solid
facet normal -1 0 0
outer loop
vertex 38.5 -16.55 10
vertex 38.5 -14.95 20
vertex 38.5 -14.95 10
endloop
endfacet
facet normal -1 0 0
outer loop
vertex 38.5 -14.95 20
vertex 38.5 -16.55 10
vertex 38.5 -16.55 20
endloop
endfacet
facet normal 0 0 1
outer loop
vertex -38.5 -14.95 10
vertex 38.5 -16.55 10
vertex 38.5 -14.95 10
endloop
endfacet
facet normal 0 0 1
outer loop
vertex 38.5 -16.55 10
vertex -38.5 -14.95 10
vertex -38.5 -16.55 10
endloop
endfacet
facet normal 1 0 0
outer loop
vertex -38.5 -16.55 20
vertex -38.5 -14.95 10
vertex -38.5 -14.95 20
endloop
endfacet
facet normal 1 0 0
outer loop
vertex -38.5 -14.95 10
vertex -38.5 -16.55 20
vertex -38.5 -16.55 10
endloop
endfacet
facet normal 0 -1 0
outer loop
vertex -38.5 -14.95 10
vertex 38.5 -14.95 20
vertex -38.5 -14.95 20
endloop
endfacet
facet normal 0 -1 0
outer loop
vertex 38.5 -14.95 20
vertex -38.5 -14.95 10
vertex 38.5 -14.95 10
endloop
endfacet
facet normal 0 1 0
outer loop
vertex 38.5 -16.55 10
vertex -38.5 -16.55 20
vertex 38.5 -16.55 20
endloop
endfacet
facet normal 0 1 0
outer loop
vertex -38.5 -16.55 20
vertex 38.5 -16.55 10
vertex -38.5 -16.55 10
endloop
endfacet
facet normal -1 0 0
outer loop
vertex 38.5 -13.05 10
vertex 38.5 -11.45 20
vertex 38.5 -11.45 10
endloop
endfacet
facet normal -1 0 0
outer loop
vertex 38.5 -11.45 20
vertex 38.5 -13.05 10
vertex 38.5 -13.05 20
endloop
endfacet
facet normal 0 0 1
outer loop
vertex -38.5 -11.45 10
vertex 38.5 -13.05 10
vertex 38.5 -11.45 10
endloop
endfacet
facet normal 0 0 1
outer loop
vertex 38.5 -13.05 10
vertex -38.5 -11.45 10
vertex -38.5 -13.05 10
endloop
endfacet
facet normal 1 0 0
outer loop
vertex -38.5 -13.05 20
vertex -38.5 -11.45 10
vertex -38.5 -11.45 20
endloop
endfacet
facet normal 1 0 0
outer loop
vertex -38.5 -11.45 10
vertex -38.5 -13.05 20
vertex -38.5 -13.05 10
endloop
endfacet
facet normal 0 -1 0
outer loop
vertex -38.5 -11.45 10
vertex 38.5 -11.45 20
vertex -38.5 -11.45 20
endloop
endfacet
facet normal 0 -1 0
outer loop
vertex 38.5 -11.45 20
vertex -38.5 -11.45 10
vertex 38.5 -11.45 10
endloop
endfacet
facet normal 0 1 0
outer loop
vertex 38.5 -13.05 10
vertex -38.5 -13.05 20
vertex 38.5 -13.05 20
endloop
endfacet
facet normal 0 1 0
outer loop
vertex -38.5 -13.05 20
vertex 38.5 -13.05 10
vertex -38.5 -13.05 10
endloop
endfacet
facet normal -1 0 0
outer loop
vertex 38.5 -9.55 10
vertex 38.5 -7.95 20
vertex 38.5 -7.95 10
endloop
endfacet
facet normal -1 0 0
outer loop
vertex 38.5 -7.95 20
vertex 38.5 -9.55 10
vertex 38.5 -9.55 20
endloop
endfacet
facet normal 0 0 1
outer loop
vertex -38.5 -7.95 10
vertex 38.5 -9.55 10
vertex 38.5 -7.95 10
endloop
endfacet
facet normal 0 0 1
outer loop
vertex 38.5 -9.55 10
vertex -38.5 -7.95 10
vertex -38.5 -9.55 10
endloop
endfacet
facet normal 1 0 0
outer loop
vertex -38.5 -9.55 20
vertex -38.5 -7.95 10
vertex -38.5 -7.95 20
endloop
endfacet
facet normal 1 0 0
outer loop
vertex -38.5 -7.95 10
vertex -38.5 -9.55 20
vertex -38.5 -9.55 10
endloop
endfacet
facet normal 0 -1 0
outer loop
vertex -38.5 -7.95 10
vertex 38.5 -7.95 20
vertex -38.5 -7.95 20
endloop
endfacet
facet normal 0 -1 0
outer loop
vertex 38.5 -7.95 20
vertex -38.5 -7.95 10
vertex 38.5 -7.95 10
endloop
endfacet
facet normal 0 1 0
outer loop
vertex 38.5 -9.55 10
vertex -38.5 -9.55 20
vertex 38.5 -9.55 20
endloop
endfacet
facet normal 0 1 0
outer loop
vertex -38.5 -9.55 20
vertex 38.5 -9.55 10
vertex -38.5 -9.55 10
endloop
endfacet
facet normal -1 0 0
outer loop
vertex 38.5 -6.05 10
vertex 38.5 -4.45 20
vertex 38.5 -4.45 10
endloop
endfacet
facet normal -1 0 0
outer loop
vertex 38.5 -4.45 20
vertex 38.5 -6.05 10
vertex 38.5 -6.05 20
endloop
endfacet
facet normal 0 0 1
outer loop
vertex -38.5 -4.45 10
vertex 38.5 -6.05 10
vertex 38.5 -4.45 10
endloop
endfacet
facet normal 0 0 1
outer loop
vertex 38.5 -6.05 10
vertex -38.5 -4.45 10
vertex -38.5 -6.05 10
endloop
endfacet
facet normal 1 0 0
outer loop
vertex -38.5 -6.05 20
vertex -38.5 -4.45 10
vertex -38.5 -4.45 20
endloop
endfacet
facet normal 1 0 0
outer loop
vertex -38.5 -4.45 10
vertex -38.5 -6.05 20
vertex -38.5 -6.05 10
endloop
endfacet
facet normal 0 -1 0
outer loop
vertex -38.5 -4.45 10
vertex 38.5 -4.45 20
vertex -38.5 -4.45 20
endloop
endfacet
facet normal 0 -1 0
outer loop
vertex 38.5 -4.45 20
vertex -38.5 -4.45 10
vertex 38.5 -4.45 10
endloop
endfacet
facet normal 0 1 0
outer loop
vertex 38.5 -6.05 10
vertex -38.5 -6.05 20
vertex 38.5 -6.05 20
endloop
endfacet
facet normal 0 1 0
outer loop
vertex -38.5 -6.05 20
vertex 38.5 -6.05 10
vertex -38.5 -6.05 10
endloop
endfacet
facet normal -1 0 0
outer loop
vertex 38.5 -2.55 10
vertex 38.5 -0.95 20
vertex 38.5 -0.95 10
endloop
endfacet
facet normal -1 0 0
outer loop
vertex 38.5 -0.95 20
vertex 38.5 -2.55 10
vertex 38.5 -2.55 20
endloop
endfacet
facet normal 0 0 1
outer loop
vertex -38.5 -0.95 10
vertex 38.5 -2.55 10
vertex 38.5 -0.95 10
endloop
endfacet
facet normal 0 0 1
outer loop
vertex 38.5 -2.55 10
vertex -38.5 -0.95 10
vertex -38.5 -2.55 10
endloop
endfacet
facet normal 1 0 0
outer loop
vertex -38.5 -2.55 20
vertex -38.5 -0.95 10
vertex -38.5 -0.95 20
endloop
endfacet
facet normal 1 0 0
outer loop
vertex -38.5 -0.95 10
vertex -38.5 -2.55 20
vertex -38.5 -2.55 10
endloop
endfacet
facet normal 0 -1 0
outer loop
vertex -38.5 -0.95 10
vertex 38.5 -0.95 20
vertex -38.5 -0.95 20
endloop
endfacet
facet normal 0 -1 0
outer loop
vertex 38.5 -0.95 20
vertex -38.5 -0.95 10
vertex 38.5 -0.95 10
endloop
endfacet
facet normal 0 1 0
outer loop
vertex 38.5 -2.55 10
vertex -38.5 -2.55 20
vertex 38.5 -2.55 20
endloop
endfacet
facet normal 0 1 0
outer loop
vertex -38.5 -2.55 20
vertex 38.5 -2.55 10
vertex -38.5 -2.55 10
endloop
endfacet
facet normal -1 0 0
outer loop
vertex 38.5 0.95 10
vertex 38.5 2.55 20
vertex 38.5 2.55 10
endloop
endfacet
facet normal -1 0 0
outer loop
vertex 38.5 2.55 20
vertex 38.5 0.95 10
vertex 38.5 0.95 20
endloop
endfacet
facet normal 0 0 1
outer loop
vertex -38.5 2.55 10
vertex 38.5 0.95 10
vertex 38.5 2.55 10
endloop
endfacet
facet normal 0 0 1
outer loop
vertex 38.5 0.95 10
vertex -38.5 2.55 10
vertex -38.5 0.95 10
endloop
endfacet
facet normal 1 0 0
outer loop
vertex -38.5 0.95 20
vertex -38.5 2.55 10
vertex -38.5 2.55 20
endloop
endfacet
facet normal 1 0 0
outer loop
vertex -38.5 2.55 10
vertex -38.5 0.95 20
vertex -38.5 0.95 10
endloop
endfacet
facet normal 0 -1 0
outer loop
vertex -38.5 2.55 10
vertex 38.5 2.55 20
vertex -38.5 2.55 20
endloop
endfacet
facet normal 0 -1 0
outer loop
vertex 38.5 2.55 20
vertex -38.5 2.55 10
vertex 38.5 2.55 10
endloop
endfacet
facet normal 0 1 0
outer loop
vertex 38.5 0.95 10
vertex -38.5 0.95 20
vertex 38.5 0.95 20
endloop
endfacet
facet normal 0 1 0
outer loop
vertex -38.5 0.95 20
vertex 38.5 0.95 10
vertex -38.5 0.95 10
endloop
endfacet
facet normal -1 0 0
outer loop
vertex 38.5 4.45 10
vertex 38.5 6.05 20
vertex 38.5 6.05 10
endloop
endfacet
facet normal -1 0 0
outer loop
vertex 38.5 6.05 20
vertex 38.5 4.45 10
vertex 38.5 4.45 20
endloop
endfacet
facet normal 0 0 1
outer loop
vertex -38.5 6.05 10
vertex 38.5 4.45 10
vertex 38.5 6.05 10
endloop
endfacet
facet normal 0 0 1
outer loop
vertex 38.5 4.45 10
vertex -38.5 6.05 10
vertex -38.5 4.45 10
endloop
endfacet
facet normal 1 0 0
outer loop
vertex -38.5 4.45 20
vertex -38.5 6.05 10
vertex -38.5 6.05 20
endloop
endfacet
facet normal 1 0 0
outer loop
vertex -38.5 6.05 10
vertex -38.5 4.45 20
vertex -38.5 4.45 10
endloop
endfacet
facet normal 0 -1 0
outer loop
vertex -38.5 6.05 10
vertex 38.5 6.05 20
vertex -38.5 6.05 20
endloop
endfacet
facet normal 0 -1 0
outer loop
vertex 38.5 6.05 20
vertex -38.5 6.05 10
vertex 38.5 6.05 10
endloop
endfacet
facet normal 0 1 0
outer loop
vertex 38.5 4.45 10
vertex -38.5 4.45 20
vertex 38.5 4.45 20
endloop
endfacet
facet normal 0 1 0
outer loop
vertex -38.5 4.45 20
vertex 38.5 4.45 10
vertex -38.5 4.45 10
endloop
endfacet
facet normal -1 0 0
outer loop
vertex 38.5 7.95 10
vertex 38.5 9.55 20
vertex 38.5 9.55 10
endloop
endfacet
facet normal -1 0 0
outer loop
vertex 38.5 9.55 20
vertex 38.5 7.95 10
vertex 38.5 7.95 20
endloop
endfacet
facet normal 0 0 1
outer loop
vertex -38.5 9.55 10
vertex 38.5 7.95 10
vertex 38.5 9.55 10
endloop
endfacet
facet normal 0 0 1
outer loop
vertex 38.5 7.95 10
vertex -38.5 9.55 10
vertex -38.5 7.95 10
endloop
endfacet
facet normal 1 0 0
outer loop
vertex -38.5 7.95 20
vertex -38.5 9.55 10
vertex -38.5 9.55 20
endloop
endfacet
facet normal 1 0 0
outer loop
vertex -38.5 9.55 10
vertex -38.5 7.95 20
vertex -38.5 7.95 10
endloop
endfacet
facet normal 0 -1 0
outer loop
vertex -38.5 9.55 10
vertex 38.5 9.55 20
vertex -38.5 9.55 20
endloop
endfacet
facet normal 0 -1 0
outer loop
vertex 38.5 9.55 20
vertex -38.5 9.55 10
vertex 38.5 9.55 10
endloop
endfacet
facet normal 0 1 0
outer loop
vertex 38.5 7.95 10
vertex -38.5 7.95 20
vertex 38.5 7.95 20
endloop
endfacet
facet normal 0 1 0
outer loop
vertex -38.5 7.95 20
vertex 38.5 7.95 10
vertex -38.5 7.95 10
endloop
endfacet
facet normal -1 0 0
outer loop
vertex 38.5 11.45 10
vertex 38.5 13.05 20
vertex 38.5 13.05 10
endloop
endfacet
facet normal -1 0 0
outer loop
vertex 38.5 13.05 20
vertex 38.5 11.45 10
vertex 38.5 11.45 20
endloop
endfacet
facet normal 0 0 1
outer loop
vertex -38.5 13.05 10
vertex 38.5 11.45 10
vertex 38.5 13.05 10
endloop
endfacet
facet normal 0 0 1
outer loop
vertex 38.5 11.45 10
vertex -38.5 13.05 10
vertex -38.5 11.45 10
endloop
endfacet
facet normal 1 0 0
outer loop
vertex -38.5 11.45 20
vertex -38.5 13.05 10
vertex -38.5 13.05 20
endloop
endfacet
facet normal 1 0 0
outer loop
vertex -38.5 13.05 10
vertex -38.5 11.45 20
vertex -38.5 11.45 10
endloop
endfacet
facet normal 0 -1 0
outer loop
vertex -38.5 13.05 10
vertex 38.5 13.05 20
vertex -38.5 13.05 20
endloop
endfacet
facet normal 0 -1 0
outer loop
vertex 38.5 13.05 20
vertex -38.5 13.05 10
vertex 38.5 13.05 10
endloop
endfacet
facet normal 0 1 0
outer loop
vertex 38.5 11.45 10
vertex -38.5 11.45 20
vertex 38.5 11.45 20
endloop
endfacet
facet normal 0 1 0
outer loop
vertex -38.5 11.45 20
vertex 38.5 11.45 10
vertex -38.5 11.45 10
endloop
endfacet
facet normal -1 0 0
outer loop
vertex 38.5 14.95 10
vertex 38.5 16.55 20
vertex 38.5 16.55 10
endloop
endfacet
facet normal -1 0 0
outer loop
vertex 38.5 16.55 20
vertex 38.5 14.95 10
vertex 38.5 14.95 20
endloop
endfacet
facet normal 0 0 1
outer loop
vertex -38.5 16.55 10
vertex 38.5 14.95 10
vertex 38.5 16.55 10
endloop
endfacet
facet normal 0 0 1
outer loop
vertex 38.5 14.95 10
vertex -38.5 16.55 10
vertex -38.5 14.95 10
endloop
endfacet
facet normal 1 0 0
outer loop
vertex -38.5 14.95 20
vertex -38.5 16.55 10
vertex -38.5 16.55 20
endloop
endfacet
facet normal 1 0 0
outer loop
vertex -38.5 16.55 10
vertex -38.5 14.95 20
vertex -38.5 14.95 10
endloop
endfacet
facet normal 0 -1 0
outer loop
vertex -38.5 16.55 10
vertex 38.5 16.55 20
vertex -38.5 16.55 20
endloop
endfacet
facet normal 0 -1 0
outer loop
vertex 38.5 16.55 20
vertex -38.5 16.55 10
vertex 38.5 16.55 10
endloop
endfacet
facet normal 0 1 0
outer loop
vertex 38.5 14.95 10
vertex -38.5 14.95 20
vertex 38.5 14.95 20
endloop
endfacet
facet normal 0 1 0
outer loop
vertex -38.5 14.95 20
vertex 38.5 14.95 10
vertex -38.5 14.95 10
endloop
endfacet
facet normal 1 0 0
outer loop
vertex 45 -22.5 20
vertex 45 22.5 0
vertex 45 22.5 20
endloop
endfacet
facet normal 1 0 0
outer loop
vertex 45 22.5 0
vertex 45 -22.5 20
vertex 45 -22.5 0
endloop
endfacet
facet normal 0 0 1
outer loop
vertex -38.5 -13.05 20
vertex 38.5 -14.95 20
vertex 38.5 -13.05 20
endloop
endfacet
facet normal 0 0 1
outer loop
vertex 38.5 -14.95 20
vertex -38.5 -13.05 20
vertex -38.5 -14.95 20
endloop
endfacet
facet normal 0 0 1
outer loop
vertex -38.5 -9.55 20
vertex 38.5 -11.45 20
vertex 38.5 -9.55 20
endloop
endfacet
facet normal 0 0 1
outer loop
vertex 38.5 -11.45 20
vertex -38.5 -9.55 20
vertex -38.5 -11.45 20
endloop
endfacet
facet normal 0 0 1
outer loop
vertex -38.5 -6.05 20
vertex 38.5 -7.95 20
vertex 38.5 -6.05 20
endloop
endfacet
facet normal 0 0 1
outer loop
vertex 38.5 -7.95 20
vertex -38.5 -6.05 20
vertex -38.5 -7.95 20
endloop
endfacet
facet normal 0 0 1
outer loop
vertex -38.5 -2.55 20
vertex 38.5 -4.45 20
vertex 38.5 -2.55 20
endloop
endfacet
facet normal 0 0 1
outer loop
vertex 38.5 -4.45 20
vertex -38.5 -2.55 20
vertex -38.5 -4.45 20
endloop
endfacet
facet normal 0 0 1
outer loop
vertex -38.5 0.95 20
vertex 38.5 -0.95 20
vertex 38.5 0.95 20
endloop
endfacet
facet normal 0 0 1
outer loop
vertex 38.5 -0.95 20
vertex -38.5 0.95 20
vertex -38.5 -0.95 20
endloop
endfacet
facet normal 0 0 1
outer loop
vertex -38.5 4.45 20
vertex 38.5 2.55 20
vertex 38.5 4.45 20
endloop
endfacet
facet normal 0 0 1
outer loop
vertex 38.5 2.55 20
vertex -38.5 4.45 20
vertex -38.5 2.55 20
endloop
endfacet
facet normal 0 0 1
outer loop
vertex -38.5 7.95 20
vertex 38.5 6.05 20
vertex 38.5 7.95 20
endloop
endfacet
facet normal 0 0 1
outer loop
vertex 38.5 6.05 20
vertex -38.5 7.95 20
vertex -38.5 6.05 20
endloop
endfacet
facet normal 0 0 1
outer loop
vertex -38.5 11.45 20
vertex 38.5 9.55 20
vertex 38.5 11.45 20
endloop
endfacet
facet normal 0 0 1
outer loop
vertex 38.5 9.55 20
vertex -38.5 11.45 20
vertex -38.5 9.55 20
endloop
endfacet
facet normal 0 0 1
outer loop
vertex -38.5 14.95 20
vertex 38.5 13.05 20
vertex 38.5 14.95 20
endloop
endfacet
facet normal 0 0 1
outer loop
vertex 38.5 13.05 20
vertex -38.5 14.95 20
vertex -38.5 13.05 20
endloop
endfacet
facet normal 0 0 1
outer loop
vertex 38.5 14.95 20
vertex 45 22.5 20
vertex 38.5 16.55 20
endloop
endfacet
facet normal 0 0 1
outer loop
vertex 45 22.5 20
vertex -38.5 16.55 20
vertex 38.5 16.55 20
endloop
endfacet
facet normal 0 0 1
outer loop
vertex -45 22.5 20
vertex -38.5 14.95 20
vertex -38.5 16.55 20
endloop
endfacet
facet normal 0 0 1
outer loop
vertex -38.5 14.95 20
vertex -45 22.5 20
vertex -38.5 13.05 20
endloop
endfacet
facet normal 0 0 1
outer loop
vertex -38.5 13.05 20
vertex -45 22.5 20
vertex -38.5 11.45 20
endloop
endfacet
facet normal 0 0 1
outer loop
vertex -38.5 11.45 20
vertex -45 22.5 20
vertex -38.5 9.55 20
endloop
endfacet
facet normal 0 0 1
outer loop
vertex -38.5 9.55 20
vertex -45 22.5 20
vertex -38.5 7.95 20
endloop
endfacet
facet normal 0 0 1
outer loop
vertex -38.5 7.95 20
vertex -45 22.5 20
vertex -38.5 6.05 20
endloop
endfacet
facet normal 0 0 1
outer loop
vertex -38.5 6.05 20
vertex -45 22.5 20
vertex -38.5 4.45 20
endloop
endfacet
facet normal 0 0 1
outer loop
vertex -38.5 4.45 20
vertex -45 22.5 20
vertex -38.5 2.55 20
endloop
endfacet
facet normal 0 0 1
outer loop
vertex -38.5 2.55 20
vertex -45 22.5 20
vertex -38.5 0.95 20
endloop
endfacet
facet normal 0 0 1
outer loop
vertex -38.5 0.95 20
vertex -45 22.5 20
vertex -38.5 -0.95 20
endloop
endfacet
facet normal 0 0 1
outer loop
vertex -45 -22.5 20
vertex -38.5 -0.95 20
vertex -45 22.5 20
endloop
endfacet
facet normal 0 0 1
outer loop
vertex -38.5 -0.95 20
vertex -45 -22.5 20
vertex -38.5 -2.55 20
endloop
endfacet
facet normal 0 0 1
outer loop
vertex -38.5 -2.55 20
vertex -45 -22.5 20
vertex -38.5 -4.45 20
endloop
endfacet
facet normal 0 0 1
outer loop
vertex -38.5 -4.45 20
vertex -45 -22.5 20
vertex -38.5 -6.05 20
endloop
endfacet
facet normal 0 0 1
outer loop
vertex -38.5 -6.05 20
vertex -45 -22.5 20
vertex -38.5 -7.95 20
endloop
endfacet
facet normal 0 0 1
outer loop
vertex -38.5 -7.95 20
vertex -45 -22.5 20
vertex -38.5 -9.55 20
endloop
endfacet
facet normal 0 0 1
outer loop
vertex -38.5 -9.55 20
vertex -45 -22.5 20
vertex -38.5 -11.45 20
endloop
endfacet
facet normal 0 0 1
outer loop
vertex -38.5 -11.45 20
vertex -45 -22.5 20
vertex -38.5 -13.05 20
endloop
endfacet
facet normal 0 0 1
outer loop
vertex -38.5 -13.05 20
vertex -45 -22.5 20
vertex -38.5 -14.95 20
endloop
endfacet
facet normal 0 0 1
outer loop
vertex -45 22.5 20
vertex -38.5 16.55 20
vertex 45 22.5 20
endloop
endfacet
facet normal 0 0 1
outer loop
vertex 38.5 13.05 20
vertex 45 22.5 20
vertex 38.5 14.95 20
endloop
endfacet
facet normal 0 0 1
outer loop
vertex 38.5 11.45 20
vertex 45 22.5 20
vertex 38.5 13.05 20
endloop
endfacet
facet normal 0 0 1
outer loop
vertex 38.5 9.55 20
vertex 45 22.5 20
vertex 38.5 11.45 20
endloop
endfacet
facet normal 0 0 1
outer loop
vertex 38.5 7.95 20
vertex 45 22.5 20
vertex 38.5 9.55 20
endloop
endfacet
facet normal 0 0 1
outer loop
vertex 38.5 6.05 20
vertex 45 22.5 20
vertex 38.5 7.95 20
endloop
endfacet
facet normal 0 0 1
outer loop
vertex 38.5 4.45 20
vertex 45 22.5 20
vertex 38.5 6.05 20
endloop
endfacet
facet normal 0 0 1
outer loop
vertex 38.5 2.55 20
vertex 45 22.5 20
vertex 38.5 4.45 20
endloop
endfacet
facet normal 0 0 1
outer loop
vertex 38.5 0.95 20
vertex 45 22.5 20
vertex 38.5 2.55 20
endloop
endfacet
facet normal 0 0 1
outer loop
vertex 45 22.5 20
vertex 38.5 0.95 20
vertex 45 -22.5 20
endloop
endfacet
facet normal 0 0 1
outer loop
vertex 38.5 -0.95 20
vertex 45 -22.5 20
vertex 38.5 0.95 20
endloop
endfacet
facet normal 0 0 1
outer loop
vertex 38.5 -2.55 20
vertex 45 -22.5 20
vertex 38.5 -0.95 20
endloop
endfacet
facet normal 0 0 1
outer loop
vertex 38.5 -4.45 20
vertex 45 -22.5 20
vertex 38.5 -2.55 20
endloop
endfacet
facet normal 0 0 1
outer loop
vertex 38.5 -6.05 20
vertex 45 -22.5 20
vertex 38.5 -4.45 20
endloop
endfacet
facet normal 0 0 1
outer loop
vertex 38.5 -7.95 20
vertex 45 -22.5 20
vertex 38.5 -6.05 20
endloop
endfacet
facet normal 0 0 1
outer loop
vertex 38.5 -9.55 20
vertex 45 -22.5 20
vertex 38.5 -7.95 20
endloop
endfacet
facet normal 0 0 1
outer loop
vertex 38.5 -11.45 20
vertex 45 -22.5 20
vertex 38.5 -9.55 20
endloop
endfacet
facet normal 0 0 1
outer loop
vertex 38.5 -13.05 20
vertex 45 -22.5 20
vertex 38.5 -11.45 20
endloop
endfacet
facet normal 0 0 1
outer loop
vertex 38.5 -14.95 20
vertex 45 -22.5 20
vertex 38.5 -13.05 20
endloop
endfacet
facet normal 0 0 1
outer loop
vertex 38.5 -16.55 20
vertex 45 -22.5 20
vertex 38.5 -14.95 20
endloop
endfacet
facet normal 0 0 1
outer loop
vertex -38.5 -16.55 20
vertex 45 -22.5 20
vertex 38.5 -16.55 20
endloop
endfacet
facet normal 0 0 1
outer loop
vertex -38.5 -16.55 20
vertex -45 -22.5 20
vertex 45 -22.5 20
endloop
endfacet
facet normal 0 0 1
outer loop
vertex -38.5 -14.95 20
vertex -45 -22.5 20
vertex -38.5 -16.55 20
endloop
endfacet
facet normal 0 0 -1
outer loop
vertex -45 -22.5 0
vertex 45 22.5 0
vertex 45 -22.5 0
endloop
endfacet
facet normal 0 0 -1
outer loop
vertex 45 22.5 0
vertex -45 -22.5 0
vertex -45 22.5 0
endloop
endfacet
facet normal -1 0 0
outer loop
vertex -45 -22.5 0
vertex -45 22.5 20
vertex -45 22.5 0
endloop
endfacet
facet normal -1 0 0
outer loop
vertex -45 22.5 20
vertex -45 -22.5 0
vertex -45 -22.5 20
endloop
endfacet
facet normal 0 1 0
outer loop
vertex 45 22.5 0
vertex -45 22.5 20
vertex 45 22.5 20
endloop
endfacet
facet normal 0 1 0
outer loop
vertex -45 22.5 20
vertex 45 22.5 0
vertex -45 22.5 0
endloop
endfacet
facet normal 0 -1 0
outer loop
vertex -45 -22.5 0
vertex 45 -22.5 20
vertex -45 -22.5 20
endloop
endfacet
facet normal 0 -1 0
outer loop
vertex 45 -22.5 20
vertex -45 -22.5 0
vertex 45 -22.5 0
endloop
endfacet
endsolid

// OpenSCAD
// Slide drying rack - holds 10 microscope slides standing upright on their long edge
// Print orientation: base block on the XY plane, slots open upward (+Z)

// ---------------- Parameters ----------------
block_len    = 90;    // base block length along X (mm)
block_wid    = 45;    // base block width along Y (mm)
block_ht     = 20;    // base block height along Z (mm)

slot_count   = 10;    // number of slide slots
slot_len     = 77;    // slot length along X (mm)
slot_wid     = 1.6;   // slot width along Y (mm)
slot_depth   = 10;    // slot depth from top face (mm)
slot_pitch   = 3.5;   // centre-to-centre slot spacing along Y (mm)

eps          = 0.5;   // overcut so cutting faces are not coplanar (mm)

$fn = 64;

// ---------------- Model ----------------
difference() {
    // Solid base block, centred in X and Y, sitting on z = 0
    translate([-block_len/2, -block_wid/2, 0])
        cube([block_len, block_wid, block_ht]);

    // Row of parallel slots, centred on the block in X and Y
    for (i = [0 : slot_count - 1]) {
        y_c = (i - (slot_count - 1)/2) * slot_pitch;
        translate([-slot_len/2, y_c - slot_wid/2, block_ht - slot_depth])
            cube([slot_len, slot_wid, slot_depth + eps]);
    }
}
